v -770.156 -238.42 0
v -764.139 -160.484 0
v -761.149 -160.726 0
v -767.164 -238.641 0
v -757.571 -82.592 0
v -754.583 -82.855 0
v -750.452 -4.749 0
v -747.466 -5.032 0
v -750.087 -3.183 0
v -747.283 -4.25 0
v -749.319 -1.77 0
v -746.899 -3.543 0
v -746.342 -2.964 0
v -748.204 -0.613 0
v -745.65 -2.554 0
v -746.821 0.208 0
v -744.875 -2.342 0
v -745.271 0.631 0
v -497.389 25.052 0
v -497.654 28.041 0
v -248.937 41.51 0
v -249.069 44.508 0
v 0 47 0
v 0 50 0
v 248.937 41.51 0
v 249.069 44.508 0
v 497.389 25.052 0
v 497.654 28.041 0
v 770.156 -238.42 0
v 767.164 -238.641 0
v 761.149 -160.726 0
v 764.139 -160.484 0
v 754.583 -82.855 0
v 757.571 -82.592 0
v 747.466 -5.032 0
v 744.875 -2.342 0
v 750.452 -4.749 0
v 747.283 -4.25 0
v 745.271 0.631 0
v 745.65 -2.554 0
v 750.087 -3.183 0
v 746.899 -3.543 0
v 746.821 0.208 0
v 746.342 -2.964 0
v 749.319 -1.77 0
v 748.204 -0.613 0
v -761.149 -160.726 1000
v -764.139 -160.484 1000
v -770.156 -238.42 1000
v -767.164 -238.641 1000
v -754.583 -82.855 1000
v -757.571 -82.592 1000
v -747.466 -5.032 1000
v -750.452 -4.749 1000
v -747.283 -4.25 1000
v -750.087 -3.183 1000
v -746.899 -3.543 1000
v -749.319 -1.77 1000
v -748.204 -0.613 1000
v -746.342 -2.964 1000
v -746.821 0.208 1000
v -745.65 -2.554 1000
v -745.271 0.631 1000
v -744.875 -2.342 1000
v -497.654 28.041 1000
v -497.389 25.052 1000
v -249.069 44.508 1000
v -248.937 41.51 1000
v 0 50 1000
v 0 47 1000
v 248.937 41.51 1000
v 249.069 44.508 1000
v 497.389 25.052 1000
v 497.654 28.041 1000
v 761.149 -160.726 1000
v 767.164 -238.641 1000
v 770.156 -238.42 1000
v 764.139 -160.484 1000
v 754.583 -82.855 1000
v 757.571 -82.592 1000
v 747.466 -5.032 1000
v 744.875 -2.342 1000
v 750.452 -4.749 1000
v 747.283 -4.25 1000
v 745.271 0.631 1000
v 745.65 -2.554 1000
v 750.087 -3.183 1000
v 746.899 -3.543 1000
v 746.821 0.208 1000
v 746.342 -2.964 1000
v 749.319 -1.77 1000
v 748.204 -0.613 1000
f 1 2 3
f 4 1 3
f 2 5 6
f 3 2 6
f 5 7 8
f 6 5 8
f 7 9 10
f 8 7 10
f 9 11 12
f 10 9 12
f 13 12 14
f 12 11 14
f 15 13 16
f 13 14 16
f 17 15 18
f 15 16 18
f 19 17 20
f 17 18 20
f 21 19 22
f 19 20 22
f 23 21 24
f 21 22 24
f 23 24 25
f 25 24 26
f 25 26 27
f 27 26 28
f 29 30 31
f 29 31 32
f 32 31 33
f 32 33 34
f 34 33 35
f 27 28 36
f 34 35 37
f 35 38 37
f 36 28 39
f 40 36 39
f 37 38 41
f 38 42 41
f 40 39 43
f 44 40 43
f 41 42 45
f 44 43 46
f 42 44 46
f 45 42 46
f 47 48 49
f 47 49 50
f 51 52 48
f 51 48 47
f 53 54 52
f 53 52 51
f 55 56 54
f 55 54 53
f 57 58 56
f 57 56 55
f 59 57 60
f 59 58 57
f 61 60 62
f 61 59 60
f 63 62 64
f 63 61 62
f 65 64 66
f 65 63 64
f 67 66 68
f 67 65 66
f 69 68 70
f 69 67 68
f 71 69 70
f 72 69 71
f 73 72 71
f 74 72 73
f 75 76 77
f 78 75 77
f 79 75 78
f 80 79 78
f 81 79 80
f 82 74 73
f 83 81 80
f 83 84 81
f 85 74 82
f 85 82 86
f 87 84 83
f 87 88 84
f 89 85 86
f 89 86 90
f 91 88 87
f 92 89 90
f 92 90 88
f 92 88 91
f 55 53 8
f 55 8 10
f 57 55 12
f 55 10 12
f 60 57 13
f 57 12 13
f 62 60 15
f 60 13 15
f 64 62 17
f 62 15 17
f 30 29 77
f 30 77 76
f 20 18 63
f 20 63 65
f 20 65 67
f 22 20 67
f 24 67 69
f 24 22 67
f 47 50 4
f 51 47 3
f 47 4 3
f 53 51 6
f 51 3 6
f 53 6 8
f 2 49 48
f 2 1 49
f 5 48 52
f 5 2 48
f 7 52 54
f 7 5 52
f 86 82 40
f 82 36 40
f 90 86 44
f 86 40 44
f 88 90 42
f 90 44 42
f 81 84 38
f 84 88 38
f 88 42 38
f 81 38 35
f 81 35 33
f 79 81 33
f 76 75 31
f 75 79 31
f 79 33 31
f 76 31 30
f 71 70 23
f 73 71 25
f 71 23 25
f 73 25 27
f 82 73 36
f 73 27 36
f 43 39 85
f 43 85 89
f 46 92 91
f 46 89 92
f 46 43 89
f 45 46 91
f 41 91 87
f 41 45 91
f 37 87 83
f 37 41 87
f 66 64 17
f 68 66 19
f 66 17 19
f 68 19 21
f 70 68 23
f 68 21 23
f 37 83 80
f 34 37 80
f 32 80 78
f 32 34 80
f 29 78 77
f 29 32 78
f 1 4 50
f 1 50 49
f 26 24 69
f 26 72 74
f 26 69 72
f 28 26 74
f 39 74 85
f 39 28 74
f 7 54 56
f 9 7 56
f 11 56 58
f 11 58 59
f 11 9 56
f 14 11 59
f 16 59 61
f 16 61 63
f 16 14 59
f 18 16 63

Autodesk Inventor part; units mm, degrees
ref_plane "YZ Plane" through (0, 0, 0) normal (1, 0, 0) x (0, 1, 0)
ref_plane "XZ Plane" through (0, 0, 0) normal (0, 1, 0) x (-1, 0, 0)
ref_plane "XY Plane" through (0, 0, 0) normal (0, 0, 1) x (1, 0, 0)
sketch "Sketch1" plane through (0, 0, 0) normal (0, 0, 1) x (1, 0, 0)
  line L0 (-750, 0) -> (750, 0) construction
  line L1 (750, 0) -> (750, -2700) construction
  line L2 (750, -2700) -> (-750, -2700) construction
  line L3 (-750, -2700) -> (-750, 0) construction
  line L4 (800, 50) -> (-800, 50) construction
  line L5 (-800, 50) -> (-800, -2750) construction
  line L6 (-800, -2750) -> (800, -2750) construction
  line L7 (800, -2750) -> (800, 50) construction
  line L8 (-850, 100) -> (850, 100) construction
  line L9 (850, 100) -> (850, -2800) construction
  line L10 (850, -2800) -> (-850, -2800) construction
  line L11 (-850, -2800) -> (-850, 100) construction
  arc A0 (750, 0) -> (745.2706, 0.6314) centre (0, -5600) ccw construction
  line L12 (-750, -2100) -> (750, -2100) construction
  line L13 (114.1118, -2698.3696) -> (750, -2100) construction
  arc A1 (750, -2100) -> (770.156, -238.4205) centre (-10250, -1050) ccw construction
  line L14 (750, 0) -> (749.6018, -2.9735) construction
  arc A2 (750, -3.0268) -> (0, 47) centre (-0.2, -5603) ccw construction
  line L15 (750, 0) -> (747.0136, -0.2851) construction
  arc A3 (767.1641, -238.6409) -> (747.4657, -5.0326) centre (-10252.9895, -1050.2527) ccw construction
  arc A4 (750.4522, -4.7486) -> (745.2706, 0.6314) centre (744.4791, -5.3162) ccw
  arc A5 (747.4657, -5.0326) -> (744.8748, -2.3426) centre (744.4792, -5.3164) ccw construction
  line L16 (750, -2100) -> (752.9864, -2100.2851) construction
  arc A6 (752.9864, -2100.2851) -> (771.2831, -213.263) centre (-10246.9891, -1050.0292) ccw construction
  line L17 (750, -2100) -> (752.0559, -2102.1848) construction
  line L18 (752.0559, -2102.1848) -> (752.0559, -2102.1848) construction
  arc A7 (749.1768, -2100.7746) -> (750.1074, -2098.8746) centre (747.1209, -2098.5898) ccw construction
  line L19 (0, -2697) -> (110, -2697) construction
  line L20 (112.0559, -2696.1848) -> (685.3133, -2156.7506) construction
  arc A8 (110, -2700) -> (114.1118, -2698.3696) centre (110, -2694) ccw construction
  arc A9 (110, -2697) -> (112.0559, -2696.1848) centre (110, -2694) ccw construction
  line L21 (685.3133, -2156.7506) -> (687.3692, -2158.9354) construction
  line L22 (752.0559, -2102.1848) -> (671.2185, -2178.2526) construction
  line L23 (671.2185, -2178.2526) -> (669.1626, -2176.0678) construction
  arc A10 (747.4657, -5.0326) -> (747.0136, -0.2851) centre (-10252.9895, -1050.2527) ccw construction
  arc A11 (745.2706, 0.6314) -> (0, 50) centre (0, -5600) ccw
  arc A12 (750.4522, -4.7486) -> (750, 0) centre (-10250, -1050) ccw construction
  line L24 (770.156, -238.4205) -> (767.1641, -238.6409) construction
  line L25 (768.2917, -213.4901) -> (771.2831, -213.263) construction
  arc A13 (770.156, -238.4205) -> (750.4522, -4.7486) centre (-10250, -1050) ccw
  line L26 (0, 100) -> (0, 50) construction
  line L27 (0, -2700) -> (0, -2697) construction
  line L28 (0, 47) -> (0, 0) construction
  line L29 (0, 50) -> (0, 47) construction
  arc A14 (752.0559, -2102.1848) -> (752.9864, -2100.2851) centre (749.9998, -2099.9999) ccw construction
  point P0 (0, -2750)
  dimension "d54" = 1500
  dimension "d55" = 2700
  dimension "d58" = 2100
  dimension "d68" = 6
  dimension "d70" = 3
  dimension "d75" = 3
  dimension "d83" = 6
  dimension "d86" = 3
  dimension "d112" = 239.271
  dimension "d113" = 50
  dimension "d114" = 50
  dimension "d115" = 3
  dimension "d117" = 110
  dimension "d118" = 25
  dimension "d119" = 111
  dimension "d120" = 25
contour flange "Contour Flange2" sketch "Sketch1" thickness 3 bend radius 3 width 1000 along (0, 0, 1) mid plane no both sides no wall seen from (760.924, -121.5323, 0) lies toward (-0.9964637, -0.0840242, 0) curves A13 A4 A11
bend "Bend2"
corner "Corner2"
mirror "Mirror2" about plane through (0, 0, 0) normal (1, 0, 0)
equation "\"d36\" = Thickness"
equation "\"d37\" = BendReliefWidth"
equation "\"d38\" = BendReliefDepth"
equation "\"d39\" = MinimumRemnant"
equation "\"d40\" = TransitionRadius"
equation "\"d42\" = BendRadius"
equation "\"d44\" = CornerReliefSize"
equation "\"d45\" = GapSize"
equation "\"d46\" = JacobiRadiusSize"
equation "\"BendRadius\" = Thickness"
equation "\"BendReliefWidth\" = Thickness"
equation "\"BendReliefDepth\" = 0.5 * Thickness"
equation "\"CornerReliefSize\" = 4 * Thickness"
equation "\"MinimumRemnant\" = 2 * Thickness"
equation "\"TransitionRadius\" = BendRadius"
equation "\"JacobiRadiusSize\" = BendRadius"
equation "\"GapSize\" = Thickness"
equation "\"Thickness\" = 3"
properties part number "МОО 033 лист спина базовый" material "Stainless Steel AISI 304"
